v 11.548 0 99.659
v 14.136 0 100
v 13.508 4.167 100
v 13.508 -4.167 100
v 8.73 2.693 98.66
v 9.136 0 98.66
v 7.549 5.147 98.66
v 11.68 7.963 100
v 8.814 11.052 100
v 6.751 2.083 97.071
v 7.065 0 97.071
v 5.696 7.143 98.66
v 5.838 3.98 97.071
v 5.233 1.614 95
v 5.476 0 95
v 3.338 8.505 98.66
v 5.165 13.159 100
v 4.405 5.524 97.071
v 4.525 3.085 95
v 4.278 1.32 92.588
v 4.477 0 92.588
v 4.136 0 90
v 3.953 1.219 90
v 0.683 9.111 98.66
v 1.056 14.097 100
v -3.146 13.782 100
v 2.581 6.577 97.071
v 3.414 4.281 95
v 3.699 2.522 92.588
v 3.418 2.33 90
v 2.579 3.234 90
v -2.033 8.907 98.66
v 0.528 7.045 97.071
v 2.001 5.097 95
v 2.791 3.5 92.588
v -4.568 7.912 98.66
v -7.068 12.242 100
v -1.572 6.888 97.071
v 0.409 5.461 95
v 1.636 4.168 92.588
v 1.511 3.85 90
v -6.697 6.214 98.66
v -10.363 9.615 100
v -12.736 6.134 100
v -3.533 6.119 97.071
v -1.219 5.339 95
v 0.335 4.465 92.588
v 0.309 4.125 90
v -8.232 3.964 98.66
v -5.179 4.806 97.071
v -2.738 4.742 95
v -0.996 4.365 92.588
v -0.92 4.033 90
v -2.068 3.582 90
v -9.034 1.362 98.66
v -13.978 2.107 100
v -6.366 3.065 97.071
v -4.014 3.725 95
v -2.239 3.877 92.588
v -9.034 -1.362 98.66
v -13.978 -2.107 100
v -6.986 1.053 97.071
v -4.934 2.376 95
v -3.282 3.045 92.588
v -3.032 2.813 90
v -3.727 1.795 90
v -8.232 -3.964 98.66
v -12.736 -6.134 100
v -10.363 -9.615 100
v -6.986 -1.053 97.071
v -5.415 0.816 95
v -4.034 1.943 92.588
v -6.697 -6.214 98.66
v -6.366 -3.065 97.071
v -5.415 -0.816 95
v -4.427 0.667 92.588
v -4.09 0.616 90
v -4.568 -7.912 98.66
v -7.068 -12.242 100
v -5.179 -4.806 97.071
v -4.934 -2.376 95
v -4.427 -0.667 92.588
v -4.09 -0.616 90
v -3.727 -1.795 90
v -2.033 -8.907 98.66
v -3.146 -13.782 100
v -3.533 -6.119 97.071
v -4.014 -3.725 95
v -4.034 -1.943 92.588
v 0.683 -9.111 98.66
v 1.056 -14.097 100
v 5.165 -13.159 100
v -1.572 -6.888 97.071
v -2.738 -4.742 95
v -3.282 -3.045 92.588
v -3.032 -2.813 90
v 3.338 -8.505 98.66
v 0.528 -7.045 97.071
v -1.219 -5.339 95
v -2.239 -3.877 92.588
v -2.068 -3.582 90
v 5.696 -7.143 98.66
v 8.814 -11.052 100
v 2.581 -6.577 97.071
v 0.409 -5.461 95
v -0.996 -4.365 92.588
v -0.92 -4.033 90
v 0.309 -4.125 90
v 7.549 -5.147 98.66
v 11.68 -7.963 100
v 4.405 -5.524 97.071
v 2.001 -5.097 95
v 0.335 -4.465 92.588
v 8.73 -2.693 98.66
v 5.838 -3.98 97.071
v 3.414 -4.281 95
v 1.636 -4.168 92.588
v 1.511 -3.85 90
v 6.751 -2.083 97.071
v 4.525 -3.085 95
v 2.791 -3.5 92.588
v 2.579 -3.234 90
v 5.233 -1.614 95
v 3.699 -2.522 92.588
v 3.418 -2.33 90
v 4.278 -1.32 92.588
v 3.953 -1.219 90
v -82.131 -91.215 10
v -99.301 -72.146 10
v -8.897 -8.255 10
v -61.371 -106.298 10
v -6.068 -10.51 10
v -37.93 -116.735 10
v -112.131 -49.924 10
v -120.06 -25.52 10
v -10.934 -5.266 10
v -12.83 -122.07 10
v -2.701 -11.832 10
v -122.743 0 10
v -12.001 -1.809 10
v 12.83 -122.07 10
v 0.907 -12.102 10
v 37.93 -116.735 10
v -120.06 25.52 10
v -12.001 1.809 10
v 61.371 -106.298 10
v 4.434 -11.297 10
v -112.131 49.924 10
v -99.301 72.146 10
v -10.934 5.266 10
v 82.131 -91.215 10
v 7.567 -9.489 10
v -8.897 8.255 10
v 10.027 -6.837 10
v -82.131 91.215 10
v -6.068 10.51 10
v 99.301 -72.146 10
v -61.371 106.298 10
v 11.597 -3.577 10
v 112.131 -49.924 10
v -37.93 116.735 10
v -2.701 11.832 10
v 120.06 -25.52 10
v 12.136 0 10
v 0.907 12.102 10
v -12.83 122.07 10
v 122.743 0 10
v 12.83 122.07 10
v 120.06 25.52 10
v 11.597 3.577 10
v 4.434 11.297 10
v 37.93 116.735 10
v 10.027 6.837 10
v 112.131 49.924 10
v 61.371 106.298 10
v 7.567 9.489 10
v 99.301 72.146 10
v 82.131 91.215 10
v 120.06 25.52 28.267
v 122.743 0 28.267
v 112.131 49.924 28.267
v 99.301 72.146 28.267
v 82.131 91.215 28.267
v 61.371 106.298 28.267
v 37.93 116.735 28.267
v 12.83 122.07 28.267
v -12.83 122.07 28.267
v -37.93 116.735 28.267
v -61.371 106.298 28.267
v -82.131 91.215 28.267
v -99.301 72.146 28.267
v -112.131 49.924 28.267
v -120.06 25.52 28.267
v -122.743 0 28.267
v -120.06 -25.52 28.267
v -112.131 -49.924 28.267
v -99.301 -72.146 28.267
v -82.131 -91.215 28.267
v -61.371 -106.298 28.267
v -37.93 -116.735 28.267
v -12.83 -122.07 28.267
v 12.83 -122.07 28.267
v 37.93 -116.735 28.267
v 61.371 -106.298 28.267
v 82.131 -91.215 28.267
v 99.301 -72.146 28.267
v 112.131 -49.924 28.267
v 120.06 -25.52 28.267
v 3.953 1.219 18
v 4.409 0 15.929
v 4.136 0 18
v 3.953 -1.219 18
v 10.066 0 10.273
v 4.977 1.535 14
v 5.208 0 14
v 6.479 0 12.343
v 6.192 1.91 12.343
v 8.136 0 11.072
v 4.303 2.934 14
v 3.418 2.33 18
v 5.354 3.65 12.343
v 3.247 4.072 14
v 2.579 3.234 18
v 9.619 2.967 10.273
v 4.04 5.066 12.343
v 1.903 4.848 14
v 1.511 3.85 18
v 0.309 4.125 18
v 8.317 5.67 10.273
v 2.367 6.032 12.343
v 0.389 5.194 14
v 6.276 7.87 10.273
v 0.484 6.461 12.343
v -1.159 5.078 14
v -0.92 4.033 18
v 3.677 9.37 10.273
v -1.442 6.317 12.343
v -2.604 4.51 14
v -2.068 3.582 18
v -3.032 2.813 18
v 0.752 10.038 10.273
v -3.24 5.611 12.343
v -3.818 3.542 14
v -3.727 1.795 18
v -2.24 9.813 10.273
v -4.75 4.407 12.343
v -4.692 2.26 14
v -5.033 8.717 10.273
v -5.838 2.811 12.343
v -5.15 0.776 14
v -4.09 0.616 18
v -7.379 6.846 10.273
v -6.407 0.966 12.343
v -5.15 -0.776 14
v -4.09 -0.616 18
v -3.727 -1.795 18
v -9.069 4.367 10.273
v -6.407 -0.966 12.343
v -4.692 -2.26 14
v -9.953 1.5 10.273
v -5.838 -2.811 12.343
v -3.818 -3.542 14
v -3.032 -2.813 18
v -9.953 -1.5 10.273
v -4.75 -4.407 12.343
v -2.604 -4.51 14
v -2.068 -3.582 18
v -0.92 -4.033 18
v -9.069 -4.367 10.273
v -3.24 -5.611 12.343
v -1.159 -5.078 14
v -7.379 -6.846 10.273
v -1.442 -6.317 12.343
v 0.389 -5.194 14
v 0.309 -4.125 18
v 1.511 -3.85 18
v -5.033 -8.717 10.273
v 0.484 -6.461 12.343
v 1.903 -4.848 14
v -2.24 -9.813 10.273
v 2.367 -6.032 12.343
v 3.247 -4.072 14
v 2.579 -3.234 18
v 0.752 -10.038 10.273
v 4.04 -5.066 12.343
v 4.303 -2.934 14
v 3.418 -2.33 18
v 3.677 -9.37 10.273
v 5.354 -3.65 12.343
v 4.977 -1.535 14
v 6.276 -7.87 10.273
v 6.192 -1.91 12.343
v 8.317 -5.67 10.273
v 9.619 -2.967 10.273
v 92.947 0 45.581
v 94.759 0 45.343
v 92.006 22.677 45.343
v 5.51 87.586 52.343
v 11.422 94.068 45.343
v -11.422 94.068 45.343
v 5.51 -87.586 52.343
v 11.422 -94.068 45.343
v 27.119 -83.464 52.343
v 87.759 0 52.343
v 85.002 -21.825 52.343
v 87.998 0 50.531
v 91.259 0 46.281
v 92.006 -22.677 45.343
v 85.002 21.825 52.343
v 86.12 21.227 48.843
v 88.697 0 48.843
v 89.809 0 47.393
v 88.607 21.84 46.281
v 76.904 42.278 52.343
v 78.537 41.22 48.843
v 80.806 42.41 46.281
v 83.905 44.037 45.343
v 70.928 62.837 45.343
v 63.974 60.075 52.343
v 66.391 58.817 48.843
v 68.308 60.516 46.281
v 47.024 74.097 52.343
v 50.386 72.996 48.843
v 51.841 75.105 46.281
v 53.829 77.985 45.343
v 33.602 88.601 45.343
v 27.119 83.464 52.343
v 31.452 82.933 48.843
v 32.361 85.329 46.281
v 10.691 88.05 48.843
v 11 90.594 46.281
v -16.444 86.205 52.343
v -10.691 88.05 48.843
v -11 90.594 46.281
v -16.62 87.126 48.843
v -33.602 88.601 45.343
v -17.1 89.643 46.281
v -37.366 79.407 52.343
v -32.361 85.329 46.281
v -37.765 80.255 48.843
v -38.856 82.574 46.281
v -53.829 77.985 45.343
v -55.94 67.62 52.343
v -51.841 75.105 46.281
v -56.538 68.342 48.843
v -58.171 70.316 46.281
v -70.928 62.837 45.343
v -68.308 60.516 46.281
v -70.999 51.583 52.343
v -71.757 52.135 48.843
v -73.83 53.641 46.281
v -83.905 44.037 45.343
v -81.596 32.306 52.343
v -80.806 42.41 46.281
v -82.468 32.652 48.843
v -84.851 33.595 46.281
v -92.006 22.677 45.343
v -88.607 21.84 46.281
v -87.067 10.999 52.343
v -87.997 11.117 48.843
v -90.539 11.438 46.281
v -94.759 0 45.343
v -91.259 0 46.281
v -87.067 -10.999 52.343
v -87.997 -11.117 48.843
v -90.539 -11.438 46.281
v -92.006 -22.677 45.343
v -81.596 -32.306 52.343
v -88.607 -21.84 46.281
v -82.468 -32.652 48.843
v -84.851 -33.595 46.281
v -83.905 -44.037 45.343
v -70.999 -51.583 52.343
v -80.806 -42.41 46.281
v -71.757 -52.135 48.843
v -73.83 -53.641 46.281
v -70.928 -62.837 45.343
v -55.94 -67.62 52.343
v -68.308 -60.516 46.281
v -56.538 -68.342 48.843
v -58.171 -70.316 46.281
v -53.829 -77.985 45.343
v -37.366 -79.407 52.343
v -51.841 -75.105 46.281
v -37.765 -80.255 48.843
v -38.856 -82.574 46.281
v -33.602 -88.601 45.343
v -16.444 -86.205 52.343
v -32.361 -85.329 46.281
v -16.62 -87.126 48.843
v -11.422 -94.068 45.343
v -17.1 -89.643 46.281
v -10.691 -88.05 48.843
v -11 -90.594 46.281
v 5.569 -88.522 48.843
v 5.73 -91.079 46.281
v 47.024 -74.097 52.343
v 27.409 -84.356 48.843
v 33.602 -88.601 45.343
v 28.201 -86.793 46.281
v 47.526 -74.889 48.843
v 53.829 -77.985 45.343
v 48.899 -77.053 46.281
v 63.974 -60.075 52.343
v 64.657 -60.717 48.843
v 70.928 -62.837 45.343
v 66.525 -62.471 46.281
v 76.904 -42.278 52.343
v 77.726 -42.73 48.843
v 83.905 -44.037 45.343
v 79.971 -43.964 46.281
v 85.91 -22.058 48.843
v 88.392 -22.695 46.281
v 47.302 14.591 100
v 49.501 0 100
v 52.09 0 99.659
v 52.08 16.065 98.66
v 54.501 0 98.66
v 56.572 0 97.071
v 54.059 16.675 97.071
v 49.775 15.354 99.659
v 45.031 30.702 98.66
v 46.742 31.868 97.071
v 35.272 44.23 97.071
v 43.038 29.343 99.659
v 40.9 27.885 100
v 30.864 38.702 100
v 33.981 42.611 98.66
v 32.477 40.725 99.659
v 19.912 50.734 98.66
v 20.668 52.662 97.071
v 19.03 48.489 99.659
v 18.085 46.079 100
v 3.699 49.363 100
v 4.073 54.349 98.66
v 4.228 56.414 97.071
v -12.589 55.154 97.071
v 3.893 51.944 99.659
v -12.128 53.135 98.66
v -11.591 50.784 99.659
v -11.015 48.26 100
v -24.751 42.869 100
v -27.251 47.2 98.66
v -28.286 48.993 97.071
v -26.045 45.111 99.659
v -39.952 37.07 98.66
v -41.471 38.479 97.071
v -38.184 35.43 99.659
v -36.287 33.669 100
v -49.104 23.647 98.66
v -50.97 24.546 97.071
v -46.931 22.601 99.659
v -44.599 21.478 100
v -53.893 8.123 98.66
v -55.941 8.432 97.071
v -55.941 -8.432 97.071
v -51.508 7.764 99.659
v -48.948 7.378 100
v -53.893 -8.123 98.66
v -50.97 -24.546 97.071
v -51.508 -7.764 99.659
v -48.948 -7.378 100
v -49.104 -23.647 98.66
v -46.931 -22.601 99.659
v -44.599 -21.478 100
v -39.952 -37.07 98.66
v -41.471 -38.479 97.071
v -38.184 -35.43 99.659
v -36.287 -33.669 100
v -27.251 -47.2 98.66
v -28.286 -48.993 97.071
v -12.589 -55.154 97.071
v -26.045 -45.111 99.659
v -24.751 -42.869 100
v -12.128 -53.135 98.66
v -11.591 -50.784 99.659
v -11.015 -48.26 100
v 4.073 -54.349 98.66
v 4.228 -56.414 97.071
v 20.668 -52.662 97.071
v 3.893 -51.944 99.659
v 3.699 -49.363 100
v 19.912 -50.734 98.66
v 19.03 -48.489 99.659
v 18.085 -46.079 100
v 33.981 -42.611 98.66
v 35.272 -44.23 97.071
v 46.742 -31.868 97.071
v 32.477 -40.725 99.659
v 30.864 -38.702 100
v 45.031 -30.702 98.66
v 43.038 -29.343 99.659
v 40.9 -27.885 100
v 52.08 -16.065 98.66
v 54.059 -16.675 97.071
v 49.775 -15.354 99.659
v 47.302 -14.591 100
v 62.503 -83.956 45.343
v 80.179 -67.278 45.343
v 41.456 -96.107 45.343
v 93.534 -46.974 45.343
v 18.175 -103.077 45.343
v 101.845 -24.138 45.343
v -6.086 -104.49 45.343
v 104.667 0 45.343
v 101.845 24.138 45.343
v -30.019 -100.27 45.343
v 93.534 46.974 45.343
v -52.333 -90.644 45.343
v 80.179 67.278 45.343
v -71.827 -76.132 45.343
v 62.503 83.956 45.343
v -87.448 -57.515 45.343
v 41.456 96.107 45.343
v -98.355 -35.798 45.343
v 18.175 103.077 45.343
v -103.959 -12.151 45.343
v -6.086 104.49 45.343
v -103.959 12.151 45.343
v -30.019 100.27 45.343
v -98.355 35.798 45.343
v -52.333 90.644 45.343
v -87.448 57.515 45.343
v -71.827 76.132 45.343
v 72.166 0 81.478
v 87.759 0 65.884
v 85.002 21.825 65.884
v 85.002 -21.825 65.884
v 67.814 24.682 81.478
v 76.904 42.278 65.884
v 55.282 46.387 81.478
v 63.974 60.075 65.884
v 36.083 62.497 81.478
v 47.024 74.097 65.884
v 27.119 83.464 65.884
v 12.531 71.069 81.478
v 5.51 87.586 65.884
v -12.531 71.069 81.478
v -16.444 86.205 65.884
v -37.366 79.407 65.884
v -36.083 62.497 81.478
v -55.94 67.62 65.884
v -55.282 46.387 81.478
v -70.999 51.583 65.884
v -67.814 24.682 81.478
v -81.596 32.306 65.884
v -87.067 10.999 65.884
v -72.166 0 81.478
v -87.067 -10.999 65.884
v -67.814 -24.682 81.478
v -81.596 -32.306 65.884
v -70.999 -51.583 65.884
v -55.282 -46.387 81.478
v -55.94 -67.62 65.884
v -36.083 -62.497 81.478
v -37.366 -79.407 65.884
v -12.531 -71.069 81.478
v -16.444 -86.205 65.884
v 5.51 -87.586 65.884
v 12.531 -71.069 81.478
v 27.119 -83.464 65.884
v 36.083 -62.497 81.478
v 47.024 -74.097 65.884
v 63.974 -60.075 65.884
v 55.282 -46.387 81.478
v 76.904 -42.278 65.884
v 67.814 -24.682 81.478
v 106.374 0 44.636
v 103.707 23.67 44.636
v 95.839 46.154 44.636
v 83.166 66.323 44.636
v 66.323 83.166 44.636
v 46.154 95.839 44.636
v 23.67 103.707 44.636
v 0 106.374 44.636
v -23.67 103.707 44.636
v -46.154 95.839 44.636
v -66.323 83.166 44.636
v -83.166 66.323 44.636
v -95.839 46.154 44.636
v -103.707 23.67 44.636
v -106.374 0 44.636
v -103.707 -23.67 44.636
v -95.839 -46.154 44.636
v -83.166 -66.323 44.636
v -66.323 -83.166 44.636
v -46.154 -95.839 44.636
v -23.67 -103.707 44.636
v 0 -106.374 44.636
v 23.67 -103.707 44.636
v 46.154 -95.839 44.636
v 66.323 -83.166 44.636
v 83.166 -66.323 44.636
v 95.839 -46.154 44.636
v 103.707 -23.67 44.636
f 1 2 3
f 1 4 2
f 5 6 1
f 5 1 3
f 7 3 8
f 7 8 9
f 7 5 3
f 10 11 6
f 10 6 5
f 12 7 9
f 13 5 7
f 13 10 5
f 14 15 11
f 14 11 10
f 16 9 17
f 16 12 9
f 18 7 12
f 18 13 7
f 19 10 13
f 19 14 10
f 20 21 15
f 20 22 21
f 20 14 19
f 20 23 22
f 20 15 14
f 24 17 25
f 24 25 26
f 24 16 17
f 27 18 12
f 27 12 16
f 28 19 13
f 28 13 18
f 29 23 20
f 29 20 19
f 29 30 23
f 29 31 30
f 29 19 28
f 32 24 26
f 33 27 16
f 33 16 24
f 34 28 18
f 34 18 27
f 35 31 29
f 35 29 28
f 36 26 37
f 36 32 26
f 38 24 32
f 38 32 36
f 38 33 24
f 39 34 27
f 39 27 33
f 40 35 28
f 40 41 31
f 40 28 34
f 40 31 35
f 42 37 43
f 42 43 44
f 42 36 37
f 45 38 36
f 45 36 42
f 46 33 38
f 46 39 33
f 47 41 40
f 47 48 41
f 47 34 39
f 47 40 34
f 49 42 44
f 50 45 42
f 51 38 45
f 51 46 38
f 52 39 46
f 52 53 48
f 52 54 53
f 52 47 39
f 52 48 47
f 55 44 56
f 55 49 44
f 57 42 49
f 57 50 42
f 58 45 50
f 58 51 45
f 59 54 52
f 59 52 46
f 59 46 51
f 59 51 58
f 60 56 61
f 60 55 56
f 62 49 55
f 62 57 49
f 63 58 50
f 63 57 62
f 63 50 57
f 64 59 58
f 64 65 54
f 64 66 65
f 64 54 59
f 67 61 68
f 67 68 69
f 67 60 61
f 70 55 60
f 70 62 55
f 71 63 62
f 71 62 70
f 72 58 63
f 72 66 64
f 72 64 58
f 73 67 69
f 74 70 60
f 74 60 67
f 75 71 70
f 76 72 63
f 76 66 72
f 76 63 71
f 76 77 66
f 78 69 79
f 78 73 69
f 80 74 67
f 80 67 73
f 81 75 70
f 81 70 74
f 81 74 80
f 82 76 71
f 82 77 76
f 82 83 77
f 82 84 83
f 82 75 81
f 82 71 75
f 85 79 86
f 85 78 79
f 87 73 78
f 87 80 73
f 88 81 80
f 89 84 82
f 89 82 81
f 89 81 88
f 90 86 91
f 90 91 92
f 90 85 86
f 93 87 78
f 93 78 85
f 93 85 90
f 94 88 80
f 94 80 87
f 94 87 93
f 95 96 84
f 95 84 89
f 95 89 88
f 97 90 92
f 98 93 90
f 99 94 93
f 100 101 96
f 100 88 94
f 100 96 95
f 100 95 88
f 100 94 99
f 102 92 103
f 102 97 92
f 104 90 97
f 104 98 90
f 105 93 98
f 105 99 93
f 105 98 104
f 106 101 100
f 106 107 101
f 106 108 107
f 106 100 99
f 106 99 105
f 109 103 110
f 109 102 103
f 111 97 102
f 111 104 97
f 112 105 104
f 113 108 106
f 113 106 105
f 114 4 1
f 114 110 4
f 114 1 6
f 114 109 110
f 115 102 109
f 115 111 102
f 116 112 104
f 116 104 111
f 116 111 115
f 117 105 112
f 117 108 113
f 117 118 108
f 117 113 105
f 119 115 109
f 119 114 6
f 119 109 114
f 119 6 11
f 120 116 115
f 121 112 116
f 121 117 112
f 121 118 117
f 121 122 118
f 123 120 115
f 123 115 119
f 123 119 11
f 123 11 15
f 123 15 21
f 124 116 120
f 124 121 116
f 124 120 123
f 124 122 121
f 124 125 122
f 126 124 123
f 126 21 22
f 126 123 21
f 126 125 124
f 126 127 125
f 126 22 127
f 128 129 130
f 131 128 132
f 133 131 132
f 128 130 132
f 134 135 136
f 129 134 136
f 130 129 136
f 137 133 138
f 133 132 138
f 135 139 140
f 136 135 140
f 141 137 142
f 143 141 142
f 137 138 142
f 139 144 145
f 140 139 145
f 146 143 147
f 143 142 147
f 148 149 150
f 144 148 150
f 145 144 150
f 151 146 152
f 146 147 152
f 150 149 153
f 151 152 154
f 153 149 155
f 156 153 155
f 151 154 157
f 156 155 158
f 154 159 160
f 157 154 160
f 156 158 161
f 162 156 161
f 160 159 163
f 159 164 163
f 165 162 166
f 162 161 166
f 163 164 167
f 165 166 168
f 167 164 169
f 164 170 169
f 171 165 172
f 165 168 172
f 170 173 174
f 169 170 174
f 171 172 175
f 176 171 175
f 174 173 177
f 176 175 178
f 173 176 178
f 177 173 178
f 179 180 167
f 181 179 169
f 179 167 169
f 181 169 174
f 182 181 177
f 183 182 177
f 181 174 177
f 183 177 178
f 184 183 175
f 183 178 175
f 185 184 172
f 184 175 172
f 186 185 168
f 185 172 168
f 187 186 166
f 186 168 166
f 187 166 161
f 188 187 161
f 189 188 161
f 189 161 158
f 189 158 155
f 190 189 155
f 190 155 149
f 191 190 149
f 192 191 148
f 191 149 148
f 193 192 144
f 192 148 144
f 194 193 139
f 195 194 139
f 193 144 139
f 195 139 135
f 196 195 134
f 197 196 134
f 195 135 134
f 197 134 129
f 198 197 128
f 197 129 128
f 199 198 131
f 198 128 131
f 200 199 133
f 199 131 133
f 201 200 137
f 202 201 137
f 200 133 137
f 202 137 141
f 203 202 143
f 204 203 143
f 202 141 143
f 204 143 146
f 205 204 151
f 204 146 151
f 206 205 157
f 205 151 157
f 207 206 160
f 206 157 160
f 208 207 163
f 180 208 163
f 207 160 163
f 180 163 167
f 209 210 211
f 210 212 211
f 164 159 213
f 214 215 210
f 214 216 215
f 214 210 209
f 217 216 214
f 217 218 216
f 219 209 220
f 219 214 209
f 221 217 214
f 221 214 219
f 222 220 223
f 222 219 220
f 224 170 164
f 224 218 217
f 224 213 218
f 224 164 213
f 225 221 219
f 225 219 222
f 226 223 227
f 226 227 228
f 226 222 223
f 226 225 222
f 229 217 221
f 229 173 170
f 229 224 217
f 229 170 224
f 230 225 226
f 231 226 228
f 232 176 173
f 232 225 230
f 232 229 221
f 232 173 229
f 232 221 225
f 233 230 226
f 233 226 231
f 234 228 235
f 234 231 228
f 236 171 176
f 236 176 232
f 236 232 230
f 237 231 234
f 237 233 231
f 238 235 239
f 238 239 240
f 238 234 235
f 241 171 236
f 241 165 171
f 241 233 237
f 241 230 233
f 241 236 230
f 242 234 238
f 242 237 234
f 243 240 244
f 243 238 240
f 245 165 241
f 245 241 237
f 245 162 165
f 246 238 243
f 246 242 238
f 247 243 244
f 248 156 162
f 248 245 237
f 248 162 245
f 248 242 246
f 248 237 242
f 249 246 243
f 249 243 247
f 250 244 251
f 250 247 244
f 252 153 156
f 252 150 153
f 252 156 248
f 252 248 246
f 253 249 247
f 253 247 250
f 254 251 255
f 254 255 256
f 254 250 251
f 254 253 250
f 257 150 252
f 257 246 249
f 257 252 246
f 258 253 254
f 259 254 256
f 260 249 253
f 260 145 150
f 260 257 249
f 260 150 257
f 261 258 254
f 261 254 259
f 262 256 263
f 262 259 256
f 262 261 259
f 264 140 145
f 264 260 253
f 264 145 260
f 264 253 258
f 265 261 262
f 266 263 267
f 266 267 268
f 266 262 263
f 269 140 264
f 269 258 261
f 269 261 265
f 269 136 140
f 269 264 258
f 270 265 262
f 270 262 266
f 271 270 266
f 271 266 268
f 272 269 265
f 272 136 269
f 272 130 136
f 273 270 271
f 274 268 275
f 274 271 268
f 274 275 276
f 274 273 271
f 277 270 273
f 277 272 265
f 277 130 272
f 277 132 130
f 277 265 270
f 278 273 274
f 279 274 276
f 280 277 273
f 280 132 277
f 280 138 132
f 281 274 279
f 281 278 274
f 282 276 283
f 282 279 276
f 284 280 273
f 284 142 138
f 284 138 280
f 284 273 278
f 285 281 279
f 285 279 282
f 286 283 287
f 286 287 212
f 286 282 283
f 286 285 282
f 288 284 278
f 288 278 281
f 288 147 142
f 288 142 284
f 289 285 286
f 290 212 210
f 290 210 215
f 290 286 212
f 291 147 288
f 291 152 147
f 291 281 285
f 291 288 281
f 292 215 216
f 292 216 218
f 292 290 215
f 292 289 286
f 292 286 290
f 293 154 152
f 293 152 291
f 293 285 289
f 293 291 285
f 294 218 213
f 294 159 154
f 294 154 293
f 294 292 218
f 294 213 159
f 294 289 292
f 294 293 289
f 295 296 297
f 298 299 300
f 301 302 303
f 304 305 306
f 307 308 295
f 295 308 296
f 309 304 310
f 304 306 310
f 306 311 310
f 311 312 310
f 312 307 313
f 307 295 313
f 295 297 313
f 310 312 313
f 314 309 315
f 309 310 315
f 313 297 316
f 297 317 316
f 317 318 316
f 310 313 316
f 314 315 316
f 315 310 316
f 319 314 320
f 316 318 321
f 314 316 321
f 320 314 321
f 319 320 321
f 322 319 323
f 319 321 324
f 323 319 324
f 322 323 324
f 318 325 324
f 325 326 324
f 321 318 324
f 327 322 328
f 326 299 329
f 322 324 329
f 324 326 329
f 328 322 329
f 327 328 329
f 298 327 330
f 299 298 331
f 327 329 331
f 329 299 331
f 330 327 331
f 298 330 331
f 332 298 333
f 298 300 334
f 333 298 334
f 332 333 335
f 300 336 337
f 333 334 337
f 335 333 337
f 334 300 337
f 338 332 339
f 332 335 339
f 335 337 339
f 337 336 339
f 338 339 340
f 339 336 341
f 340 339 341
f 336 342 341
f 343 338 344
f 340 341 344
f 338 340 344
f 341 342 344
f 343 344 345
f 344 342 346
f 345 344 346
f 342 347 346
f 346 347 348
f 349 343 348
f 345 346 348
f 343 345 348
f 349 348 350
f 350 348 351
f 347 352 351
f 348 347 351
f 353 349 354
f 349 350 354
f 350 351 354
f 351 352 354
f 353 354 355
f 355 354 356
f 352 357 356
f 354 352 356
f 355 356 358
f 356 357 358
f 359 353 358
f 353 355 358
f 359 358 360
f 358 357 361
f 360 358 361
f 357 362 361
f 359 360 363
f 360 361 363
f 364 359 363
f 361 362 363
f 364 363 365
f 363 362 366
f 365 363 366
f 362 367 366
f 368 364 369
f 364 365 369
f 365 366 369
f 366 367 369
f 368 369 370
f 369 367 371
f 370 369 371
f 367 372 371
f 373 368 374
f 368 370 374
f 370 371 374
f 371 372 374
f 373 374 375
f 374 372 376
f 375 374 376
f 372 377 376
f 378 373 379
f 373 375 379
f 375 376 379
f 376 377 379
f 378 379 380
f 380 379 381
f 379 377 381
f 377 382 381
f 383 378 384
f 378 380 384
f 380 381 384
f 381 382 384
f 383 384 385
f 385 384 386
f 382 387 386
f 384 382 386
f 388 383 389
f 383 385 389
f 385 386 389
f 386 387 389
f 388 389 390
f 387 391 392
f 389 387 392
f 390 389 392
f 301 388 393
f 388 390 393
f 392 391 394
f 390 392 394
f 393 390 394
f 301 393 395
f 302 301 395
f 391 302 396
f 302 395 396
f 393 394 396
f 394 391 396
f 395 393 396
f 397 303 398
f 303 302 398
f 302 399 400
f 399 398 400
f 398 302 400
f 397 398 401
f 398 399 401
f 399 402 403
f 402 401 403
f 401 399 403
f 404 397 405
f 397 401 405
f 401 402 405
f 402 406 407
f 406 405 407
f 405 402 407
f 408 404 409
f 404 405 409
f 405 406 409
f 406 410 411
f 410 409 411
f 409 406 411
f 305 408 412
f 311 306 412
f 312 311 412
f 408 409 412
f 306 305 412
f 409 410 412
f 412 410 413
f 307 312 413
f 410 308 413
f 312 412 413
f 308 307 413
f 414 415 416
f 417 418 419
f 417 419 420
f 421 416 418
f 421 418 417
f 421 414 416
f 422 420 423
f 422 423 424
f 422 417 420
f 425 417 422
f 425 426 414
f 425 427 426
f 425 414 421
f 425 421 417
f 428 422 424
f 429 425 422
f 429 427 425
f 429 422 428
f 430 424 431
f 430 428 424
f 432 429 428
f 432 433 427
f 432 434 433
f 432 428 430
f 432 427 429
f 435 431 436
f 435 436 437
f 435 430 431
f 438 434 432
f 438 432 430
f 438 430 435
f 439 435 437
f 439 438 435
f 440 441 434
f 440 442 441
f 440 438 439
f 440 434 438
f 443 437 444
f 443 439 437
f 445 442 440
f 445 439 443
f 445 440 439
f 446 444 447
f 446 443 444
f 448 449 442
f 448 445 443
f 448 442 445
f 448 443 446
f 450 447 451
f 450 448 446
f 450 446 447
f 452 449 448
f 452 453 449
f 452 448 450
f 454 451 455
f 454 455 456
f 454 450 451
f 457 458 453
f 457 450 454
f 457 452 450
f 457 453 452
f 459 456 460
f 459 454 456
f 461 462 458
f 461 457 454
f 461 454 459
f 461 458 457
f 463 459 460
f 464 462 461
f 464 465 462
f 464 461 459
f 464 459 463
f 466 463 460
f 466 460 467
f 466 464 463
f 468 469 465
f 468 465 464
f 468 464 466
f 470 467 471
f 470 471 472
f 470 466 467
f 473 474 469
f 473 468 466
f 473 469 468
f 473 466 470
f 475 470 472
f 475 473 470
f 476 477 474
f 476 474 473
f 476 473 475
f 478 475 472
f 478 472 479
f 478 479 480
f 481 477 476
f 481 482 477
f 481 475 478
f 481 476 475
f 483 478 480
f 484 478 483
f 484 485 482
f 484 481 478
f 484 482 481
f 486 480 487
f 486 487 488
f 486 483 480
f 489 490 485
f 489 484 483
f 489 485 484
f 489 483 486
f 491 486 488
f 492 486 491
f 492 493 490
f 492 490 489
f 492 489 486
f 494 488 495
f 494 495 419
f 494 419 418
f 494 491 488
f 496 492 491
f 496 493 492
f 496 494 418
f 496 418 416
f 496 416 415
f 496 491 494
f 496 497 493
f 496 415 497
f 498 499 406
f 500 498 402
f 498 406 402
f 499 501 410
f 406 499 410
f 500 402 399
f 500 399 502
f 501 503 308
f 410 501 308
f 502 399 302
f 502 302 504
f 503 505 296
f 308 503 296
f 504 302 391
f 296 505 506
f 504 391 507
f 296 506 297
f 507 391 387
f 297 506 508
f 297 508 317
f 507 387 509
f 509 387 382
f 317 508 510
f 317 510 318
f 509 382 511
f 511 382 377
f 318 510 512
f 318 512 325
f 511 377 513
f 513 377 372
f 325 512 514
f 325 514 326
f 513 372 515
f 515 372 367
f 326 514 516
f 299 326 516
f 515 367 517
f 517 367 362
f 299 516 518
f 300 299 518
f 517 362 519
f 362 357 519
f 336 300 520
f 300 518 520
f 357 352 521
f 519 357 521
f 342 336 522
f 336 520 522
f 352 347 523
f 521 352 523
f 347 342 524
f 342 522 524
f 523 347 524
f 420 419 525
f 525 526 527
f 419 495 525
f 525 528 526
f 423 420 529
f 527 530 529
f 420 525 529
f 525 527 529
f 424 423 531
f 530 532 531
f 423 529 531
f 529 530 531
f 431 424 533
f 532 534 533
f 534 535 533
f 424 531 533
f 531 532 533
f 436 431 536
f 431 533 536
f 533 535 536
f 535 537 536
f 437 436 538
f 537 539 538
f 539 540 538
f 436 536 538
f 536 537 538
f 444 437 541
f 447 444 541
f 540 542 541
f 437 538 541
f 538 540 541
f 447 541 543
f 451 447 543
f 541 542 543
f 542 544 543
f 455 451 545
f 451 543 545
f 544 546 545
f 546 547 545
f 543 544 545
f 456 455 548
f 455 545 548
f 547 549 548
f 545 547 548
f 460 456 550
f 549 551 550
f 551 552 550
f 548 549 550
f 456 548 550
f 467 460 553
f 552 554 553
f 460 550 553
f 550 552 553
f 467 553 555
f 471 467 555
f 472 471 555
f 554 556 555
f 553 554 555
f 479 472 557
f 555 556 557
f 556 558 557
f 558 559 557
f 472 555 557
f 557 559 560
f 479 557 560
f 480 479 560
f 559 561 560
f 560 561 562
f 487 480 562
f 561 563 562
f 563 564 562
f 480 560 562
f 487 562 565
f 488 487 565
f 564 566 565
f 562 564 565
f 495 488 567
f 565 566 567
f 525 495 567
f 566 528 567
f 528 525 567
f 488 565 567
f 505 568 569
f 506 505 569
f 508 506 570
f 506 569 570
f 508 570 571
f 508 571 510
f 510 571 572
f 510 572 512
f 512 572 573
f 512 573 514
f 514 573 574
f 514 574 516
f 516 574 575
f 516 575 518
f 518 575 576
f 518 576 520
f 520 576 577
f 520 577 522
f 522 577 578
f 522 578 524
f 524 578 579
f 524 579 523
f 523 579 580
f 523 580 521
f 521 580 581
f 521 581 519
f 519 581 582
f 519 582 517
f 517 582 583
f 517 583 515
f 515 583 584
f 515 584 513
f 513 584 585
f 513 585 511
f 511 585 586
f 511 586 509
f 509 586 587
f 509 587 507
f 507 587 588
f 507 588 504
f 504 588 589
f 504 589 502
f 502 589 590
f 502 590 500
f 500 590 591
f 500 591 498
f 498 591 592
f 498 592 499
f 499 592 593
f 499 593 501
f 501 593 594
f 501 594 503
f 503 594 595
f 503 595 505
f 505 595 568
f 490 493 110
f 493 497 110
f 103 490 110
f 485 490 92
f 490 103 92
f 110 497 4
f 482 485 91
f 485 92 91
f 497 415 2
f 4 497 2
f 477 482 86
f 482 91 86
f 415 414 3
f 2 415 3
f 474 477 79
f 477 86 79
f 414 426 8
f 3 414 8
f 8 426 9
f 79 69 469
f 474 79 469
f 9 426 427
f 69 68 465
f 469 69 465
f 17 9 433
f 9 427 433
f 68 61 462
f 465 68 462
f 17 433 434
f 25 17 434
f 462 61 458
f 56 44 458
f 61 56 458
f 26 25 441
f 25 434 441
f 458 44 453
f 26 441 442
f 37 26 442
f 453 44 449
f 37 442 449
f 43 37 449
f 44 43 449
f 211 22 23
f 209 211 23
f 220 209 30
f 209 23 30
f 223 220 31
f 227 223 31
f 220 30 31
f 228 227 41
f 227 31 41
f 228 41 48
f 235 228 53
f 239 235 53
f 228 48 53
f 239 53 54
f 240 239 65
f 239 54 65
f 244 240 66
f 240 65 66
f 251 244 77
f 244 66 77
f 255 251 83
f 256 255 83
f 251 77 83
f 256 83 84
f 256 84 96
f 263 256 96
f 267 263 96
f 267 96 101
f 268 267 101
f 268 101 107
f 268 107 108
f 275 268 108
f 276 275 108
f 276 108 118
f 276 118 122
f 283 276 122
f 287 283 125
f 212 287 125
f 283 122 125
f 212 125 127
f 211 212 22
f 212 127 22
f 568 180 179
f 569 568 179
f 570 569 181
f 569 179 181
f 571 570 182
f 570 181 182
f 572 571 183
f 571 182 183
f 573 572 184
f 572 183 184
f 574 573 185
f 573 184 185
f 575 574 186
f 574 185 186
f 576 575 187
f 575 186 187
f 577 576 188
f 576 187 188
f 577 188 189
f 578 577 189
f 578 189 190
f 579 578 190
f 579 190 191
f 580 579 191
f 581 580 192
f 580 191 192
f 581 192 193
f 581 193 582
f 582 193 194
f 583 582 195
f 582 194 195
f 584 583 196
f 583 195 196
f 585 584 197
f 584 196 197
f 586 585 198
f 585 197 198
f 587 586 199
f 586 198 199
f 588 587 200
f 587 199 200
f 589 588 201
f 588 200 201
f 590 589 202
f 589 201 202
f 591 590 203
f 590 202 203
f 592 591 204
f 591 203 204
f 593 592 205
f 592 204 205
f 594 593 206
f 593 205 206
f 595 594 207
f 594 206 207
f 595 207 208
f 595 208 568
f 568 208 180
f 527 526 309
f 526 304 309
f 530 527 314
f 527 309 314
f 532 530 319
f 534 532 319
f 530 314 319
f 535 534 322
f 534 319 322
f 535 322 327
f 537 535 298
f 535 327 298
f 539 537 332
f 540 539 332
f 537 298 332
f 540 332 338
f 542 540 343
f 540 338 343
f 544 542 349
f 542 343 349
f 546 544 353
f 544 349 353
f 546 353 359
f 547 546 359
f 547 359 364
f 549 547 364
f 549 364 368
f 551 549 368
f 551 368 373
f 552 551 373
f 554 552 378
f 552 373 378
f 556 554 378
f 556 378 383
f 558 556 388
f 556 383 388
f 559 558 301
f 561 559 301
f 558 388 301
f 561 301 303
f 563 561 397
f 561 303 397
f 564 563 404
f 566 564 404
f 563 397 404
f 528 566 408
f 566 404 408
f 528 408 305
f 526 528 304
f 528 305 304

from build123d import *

# Parameters (mm, degrees)
CHAMFER_SIZE = 1
FILLET_R     = 10


with BuildPart() as part:
    # Sketch → Revolution (revolve)
    with BuildSketch(Plane.XZ):
        with BuildLine():
            Line((4.136281, 100), (53.643467, 100))
            Line((53.643467, 100), (87.759073, 65.884394))
            Line((87.759073, 65.884394), (87.759073, 52.342683))
            ThreePointArc((87.759073, 52.342683), (89.809326, 47.392936), (94.759073, 45.342683))
            Line((94.759073, 45.342683), (105.666697, 45.342683))
            Line((105.666697, 45.342683), (122.742529, 28.266851))
            Line((122.742529, 28.266851), (122.742529, 10))
            Line((122.742529, 10), (12.136281, 10))
            ThreePointArc((4.136281, 18), (6.479427, 12.343146), (12.136281, 10))
            Line((4.136281, 18), (4.136281, 100))
        make_face()
    revolve(axis=Axis((0, 0, 0), (0, 0, 1)))

    # Chamfer
    chamfer_edges = [part.edges().sort_by_distance(p)[0] for p in [
        (-94.759073, 0, 45.342683),
        (-105.666697, 0, 45.342683),
    ]]
    chamfer(chamfer_edges, length=CHAMFER_SIZE)

    # Fillet
    fillet_edges = [part.edges().sort_by_distance(p)[0] for p in [
        (-4.136281, 0, 100),
        (-53.643467, 0, 100),
    ]]
    fillet(fillet_edges, radius=FILLET_R)


solid = part.part
